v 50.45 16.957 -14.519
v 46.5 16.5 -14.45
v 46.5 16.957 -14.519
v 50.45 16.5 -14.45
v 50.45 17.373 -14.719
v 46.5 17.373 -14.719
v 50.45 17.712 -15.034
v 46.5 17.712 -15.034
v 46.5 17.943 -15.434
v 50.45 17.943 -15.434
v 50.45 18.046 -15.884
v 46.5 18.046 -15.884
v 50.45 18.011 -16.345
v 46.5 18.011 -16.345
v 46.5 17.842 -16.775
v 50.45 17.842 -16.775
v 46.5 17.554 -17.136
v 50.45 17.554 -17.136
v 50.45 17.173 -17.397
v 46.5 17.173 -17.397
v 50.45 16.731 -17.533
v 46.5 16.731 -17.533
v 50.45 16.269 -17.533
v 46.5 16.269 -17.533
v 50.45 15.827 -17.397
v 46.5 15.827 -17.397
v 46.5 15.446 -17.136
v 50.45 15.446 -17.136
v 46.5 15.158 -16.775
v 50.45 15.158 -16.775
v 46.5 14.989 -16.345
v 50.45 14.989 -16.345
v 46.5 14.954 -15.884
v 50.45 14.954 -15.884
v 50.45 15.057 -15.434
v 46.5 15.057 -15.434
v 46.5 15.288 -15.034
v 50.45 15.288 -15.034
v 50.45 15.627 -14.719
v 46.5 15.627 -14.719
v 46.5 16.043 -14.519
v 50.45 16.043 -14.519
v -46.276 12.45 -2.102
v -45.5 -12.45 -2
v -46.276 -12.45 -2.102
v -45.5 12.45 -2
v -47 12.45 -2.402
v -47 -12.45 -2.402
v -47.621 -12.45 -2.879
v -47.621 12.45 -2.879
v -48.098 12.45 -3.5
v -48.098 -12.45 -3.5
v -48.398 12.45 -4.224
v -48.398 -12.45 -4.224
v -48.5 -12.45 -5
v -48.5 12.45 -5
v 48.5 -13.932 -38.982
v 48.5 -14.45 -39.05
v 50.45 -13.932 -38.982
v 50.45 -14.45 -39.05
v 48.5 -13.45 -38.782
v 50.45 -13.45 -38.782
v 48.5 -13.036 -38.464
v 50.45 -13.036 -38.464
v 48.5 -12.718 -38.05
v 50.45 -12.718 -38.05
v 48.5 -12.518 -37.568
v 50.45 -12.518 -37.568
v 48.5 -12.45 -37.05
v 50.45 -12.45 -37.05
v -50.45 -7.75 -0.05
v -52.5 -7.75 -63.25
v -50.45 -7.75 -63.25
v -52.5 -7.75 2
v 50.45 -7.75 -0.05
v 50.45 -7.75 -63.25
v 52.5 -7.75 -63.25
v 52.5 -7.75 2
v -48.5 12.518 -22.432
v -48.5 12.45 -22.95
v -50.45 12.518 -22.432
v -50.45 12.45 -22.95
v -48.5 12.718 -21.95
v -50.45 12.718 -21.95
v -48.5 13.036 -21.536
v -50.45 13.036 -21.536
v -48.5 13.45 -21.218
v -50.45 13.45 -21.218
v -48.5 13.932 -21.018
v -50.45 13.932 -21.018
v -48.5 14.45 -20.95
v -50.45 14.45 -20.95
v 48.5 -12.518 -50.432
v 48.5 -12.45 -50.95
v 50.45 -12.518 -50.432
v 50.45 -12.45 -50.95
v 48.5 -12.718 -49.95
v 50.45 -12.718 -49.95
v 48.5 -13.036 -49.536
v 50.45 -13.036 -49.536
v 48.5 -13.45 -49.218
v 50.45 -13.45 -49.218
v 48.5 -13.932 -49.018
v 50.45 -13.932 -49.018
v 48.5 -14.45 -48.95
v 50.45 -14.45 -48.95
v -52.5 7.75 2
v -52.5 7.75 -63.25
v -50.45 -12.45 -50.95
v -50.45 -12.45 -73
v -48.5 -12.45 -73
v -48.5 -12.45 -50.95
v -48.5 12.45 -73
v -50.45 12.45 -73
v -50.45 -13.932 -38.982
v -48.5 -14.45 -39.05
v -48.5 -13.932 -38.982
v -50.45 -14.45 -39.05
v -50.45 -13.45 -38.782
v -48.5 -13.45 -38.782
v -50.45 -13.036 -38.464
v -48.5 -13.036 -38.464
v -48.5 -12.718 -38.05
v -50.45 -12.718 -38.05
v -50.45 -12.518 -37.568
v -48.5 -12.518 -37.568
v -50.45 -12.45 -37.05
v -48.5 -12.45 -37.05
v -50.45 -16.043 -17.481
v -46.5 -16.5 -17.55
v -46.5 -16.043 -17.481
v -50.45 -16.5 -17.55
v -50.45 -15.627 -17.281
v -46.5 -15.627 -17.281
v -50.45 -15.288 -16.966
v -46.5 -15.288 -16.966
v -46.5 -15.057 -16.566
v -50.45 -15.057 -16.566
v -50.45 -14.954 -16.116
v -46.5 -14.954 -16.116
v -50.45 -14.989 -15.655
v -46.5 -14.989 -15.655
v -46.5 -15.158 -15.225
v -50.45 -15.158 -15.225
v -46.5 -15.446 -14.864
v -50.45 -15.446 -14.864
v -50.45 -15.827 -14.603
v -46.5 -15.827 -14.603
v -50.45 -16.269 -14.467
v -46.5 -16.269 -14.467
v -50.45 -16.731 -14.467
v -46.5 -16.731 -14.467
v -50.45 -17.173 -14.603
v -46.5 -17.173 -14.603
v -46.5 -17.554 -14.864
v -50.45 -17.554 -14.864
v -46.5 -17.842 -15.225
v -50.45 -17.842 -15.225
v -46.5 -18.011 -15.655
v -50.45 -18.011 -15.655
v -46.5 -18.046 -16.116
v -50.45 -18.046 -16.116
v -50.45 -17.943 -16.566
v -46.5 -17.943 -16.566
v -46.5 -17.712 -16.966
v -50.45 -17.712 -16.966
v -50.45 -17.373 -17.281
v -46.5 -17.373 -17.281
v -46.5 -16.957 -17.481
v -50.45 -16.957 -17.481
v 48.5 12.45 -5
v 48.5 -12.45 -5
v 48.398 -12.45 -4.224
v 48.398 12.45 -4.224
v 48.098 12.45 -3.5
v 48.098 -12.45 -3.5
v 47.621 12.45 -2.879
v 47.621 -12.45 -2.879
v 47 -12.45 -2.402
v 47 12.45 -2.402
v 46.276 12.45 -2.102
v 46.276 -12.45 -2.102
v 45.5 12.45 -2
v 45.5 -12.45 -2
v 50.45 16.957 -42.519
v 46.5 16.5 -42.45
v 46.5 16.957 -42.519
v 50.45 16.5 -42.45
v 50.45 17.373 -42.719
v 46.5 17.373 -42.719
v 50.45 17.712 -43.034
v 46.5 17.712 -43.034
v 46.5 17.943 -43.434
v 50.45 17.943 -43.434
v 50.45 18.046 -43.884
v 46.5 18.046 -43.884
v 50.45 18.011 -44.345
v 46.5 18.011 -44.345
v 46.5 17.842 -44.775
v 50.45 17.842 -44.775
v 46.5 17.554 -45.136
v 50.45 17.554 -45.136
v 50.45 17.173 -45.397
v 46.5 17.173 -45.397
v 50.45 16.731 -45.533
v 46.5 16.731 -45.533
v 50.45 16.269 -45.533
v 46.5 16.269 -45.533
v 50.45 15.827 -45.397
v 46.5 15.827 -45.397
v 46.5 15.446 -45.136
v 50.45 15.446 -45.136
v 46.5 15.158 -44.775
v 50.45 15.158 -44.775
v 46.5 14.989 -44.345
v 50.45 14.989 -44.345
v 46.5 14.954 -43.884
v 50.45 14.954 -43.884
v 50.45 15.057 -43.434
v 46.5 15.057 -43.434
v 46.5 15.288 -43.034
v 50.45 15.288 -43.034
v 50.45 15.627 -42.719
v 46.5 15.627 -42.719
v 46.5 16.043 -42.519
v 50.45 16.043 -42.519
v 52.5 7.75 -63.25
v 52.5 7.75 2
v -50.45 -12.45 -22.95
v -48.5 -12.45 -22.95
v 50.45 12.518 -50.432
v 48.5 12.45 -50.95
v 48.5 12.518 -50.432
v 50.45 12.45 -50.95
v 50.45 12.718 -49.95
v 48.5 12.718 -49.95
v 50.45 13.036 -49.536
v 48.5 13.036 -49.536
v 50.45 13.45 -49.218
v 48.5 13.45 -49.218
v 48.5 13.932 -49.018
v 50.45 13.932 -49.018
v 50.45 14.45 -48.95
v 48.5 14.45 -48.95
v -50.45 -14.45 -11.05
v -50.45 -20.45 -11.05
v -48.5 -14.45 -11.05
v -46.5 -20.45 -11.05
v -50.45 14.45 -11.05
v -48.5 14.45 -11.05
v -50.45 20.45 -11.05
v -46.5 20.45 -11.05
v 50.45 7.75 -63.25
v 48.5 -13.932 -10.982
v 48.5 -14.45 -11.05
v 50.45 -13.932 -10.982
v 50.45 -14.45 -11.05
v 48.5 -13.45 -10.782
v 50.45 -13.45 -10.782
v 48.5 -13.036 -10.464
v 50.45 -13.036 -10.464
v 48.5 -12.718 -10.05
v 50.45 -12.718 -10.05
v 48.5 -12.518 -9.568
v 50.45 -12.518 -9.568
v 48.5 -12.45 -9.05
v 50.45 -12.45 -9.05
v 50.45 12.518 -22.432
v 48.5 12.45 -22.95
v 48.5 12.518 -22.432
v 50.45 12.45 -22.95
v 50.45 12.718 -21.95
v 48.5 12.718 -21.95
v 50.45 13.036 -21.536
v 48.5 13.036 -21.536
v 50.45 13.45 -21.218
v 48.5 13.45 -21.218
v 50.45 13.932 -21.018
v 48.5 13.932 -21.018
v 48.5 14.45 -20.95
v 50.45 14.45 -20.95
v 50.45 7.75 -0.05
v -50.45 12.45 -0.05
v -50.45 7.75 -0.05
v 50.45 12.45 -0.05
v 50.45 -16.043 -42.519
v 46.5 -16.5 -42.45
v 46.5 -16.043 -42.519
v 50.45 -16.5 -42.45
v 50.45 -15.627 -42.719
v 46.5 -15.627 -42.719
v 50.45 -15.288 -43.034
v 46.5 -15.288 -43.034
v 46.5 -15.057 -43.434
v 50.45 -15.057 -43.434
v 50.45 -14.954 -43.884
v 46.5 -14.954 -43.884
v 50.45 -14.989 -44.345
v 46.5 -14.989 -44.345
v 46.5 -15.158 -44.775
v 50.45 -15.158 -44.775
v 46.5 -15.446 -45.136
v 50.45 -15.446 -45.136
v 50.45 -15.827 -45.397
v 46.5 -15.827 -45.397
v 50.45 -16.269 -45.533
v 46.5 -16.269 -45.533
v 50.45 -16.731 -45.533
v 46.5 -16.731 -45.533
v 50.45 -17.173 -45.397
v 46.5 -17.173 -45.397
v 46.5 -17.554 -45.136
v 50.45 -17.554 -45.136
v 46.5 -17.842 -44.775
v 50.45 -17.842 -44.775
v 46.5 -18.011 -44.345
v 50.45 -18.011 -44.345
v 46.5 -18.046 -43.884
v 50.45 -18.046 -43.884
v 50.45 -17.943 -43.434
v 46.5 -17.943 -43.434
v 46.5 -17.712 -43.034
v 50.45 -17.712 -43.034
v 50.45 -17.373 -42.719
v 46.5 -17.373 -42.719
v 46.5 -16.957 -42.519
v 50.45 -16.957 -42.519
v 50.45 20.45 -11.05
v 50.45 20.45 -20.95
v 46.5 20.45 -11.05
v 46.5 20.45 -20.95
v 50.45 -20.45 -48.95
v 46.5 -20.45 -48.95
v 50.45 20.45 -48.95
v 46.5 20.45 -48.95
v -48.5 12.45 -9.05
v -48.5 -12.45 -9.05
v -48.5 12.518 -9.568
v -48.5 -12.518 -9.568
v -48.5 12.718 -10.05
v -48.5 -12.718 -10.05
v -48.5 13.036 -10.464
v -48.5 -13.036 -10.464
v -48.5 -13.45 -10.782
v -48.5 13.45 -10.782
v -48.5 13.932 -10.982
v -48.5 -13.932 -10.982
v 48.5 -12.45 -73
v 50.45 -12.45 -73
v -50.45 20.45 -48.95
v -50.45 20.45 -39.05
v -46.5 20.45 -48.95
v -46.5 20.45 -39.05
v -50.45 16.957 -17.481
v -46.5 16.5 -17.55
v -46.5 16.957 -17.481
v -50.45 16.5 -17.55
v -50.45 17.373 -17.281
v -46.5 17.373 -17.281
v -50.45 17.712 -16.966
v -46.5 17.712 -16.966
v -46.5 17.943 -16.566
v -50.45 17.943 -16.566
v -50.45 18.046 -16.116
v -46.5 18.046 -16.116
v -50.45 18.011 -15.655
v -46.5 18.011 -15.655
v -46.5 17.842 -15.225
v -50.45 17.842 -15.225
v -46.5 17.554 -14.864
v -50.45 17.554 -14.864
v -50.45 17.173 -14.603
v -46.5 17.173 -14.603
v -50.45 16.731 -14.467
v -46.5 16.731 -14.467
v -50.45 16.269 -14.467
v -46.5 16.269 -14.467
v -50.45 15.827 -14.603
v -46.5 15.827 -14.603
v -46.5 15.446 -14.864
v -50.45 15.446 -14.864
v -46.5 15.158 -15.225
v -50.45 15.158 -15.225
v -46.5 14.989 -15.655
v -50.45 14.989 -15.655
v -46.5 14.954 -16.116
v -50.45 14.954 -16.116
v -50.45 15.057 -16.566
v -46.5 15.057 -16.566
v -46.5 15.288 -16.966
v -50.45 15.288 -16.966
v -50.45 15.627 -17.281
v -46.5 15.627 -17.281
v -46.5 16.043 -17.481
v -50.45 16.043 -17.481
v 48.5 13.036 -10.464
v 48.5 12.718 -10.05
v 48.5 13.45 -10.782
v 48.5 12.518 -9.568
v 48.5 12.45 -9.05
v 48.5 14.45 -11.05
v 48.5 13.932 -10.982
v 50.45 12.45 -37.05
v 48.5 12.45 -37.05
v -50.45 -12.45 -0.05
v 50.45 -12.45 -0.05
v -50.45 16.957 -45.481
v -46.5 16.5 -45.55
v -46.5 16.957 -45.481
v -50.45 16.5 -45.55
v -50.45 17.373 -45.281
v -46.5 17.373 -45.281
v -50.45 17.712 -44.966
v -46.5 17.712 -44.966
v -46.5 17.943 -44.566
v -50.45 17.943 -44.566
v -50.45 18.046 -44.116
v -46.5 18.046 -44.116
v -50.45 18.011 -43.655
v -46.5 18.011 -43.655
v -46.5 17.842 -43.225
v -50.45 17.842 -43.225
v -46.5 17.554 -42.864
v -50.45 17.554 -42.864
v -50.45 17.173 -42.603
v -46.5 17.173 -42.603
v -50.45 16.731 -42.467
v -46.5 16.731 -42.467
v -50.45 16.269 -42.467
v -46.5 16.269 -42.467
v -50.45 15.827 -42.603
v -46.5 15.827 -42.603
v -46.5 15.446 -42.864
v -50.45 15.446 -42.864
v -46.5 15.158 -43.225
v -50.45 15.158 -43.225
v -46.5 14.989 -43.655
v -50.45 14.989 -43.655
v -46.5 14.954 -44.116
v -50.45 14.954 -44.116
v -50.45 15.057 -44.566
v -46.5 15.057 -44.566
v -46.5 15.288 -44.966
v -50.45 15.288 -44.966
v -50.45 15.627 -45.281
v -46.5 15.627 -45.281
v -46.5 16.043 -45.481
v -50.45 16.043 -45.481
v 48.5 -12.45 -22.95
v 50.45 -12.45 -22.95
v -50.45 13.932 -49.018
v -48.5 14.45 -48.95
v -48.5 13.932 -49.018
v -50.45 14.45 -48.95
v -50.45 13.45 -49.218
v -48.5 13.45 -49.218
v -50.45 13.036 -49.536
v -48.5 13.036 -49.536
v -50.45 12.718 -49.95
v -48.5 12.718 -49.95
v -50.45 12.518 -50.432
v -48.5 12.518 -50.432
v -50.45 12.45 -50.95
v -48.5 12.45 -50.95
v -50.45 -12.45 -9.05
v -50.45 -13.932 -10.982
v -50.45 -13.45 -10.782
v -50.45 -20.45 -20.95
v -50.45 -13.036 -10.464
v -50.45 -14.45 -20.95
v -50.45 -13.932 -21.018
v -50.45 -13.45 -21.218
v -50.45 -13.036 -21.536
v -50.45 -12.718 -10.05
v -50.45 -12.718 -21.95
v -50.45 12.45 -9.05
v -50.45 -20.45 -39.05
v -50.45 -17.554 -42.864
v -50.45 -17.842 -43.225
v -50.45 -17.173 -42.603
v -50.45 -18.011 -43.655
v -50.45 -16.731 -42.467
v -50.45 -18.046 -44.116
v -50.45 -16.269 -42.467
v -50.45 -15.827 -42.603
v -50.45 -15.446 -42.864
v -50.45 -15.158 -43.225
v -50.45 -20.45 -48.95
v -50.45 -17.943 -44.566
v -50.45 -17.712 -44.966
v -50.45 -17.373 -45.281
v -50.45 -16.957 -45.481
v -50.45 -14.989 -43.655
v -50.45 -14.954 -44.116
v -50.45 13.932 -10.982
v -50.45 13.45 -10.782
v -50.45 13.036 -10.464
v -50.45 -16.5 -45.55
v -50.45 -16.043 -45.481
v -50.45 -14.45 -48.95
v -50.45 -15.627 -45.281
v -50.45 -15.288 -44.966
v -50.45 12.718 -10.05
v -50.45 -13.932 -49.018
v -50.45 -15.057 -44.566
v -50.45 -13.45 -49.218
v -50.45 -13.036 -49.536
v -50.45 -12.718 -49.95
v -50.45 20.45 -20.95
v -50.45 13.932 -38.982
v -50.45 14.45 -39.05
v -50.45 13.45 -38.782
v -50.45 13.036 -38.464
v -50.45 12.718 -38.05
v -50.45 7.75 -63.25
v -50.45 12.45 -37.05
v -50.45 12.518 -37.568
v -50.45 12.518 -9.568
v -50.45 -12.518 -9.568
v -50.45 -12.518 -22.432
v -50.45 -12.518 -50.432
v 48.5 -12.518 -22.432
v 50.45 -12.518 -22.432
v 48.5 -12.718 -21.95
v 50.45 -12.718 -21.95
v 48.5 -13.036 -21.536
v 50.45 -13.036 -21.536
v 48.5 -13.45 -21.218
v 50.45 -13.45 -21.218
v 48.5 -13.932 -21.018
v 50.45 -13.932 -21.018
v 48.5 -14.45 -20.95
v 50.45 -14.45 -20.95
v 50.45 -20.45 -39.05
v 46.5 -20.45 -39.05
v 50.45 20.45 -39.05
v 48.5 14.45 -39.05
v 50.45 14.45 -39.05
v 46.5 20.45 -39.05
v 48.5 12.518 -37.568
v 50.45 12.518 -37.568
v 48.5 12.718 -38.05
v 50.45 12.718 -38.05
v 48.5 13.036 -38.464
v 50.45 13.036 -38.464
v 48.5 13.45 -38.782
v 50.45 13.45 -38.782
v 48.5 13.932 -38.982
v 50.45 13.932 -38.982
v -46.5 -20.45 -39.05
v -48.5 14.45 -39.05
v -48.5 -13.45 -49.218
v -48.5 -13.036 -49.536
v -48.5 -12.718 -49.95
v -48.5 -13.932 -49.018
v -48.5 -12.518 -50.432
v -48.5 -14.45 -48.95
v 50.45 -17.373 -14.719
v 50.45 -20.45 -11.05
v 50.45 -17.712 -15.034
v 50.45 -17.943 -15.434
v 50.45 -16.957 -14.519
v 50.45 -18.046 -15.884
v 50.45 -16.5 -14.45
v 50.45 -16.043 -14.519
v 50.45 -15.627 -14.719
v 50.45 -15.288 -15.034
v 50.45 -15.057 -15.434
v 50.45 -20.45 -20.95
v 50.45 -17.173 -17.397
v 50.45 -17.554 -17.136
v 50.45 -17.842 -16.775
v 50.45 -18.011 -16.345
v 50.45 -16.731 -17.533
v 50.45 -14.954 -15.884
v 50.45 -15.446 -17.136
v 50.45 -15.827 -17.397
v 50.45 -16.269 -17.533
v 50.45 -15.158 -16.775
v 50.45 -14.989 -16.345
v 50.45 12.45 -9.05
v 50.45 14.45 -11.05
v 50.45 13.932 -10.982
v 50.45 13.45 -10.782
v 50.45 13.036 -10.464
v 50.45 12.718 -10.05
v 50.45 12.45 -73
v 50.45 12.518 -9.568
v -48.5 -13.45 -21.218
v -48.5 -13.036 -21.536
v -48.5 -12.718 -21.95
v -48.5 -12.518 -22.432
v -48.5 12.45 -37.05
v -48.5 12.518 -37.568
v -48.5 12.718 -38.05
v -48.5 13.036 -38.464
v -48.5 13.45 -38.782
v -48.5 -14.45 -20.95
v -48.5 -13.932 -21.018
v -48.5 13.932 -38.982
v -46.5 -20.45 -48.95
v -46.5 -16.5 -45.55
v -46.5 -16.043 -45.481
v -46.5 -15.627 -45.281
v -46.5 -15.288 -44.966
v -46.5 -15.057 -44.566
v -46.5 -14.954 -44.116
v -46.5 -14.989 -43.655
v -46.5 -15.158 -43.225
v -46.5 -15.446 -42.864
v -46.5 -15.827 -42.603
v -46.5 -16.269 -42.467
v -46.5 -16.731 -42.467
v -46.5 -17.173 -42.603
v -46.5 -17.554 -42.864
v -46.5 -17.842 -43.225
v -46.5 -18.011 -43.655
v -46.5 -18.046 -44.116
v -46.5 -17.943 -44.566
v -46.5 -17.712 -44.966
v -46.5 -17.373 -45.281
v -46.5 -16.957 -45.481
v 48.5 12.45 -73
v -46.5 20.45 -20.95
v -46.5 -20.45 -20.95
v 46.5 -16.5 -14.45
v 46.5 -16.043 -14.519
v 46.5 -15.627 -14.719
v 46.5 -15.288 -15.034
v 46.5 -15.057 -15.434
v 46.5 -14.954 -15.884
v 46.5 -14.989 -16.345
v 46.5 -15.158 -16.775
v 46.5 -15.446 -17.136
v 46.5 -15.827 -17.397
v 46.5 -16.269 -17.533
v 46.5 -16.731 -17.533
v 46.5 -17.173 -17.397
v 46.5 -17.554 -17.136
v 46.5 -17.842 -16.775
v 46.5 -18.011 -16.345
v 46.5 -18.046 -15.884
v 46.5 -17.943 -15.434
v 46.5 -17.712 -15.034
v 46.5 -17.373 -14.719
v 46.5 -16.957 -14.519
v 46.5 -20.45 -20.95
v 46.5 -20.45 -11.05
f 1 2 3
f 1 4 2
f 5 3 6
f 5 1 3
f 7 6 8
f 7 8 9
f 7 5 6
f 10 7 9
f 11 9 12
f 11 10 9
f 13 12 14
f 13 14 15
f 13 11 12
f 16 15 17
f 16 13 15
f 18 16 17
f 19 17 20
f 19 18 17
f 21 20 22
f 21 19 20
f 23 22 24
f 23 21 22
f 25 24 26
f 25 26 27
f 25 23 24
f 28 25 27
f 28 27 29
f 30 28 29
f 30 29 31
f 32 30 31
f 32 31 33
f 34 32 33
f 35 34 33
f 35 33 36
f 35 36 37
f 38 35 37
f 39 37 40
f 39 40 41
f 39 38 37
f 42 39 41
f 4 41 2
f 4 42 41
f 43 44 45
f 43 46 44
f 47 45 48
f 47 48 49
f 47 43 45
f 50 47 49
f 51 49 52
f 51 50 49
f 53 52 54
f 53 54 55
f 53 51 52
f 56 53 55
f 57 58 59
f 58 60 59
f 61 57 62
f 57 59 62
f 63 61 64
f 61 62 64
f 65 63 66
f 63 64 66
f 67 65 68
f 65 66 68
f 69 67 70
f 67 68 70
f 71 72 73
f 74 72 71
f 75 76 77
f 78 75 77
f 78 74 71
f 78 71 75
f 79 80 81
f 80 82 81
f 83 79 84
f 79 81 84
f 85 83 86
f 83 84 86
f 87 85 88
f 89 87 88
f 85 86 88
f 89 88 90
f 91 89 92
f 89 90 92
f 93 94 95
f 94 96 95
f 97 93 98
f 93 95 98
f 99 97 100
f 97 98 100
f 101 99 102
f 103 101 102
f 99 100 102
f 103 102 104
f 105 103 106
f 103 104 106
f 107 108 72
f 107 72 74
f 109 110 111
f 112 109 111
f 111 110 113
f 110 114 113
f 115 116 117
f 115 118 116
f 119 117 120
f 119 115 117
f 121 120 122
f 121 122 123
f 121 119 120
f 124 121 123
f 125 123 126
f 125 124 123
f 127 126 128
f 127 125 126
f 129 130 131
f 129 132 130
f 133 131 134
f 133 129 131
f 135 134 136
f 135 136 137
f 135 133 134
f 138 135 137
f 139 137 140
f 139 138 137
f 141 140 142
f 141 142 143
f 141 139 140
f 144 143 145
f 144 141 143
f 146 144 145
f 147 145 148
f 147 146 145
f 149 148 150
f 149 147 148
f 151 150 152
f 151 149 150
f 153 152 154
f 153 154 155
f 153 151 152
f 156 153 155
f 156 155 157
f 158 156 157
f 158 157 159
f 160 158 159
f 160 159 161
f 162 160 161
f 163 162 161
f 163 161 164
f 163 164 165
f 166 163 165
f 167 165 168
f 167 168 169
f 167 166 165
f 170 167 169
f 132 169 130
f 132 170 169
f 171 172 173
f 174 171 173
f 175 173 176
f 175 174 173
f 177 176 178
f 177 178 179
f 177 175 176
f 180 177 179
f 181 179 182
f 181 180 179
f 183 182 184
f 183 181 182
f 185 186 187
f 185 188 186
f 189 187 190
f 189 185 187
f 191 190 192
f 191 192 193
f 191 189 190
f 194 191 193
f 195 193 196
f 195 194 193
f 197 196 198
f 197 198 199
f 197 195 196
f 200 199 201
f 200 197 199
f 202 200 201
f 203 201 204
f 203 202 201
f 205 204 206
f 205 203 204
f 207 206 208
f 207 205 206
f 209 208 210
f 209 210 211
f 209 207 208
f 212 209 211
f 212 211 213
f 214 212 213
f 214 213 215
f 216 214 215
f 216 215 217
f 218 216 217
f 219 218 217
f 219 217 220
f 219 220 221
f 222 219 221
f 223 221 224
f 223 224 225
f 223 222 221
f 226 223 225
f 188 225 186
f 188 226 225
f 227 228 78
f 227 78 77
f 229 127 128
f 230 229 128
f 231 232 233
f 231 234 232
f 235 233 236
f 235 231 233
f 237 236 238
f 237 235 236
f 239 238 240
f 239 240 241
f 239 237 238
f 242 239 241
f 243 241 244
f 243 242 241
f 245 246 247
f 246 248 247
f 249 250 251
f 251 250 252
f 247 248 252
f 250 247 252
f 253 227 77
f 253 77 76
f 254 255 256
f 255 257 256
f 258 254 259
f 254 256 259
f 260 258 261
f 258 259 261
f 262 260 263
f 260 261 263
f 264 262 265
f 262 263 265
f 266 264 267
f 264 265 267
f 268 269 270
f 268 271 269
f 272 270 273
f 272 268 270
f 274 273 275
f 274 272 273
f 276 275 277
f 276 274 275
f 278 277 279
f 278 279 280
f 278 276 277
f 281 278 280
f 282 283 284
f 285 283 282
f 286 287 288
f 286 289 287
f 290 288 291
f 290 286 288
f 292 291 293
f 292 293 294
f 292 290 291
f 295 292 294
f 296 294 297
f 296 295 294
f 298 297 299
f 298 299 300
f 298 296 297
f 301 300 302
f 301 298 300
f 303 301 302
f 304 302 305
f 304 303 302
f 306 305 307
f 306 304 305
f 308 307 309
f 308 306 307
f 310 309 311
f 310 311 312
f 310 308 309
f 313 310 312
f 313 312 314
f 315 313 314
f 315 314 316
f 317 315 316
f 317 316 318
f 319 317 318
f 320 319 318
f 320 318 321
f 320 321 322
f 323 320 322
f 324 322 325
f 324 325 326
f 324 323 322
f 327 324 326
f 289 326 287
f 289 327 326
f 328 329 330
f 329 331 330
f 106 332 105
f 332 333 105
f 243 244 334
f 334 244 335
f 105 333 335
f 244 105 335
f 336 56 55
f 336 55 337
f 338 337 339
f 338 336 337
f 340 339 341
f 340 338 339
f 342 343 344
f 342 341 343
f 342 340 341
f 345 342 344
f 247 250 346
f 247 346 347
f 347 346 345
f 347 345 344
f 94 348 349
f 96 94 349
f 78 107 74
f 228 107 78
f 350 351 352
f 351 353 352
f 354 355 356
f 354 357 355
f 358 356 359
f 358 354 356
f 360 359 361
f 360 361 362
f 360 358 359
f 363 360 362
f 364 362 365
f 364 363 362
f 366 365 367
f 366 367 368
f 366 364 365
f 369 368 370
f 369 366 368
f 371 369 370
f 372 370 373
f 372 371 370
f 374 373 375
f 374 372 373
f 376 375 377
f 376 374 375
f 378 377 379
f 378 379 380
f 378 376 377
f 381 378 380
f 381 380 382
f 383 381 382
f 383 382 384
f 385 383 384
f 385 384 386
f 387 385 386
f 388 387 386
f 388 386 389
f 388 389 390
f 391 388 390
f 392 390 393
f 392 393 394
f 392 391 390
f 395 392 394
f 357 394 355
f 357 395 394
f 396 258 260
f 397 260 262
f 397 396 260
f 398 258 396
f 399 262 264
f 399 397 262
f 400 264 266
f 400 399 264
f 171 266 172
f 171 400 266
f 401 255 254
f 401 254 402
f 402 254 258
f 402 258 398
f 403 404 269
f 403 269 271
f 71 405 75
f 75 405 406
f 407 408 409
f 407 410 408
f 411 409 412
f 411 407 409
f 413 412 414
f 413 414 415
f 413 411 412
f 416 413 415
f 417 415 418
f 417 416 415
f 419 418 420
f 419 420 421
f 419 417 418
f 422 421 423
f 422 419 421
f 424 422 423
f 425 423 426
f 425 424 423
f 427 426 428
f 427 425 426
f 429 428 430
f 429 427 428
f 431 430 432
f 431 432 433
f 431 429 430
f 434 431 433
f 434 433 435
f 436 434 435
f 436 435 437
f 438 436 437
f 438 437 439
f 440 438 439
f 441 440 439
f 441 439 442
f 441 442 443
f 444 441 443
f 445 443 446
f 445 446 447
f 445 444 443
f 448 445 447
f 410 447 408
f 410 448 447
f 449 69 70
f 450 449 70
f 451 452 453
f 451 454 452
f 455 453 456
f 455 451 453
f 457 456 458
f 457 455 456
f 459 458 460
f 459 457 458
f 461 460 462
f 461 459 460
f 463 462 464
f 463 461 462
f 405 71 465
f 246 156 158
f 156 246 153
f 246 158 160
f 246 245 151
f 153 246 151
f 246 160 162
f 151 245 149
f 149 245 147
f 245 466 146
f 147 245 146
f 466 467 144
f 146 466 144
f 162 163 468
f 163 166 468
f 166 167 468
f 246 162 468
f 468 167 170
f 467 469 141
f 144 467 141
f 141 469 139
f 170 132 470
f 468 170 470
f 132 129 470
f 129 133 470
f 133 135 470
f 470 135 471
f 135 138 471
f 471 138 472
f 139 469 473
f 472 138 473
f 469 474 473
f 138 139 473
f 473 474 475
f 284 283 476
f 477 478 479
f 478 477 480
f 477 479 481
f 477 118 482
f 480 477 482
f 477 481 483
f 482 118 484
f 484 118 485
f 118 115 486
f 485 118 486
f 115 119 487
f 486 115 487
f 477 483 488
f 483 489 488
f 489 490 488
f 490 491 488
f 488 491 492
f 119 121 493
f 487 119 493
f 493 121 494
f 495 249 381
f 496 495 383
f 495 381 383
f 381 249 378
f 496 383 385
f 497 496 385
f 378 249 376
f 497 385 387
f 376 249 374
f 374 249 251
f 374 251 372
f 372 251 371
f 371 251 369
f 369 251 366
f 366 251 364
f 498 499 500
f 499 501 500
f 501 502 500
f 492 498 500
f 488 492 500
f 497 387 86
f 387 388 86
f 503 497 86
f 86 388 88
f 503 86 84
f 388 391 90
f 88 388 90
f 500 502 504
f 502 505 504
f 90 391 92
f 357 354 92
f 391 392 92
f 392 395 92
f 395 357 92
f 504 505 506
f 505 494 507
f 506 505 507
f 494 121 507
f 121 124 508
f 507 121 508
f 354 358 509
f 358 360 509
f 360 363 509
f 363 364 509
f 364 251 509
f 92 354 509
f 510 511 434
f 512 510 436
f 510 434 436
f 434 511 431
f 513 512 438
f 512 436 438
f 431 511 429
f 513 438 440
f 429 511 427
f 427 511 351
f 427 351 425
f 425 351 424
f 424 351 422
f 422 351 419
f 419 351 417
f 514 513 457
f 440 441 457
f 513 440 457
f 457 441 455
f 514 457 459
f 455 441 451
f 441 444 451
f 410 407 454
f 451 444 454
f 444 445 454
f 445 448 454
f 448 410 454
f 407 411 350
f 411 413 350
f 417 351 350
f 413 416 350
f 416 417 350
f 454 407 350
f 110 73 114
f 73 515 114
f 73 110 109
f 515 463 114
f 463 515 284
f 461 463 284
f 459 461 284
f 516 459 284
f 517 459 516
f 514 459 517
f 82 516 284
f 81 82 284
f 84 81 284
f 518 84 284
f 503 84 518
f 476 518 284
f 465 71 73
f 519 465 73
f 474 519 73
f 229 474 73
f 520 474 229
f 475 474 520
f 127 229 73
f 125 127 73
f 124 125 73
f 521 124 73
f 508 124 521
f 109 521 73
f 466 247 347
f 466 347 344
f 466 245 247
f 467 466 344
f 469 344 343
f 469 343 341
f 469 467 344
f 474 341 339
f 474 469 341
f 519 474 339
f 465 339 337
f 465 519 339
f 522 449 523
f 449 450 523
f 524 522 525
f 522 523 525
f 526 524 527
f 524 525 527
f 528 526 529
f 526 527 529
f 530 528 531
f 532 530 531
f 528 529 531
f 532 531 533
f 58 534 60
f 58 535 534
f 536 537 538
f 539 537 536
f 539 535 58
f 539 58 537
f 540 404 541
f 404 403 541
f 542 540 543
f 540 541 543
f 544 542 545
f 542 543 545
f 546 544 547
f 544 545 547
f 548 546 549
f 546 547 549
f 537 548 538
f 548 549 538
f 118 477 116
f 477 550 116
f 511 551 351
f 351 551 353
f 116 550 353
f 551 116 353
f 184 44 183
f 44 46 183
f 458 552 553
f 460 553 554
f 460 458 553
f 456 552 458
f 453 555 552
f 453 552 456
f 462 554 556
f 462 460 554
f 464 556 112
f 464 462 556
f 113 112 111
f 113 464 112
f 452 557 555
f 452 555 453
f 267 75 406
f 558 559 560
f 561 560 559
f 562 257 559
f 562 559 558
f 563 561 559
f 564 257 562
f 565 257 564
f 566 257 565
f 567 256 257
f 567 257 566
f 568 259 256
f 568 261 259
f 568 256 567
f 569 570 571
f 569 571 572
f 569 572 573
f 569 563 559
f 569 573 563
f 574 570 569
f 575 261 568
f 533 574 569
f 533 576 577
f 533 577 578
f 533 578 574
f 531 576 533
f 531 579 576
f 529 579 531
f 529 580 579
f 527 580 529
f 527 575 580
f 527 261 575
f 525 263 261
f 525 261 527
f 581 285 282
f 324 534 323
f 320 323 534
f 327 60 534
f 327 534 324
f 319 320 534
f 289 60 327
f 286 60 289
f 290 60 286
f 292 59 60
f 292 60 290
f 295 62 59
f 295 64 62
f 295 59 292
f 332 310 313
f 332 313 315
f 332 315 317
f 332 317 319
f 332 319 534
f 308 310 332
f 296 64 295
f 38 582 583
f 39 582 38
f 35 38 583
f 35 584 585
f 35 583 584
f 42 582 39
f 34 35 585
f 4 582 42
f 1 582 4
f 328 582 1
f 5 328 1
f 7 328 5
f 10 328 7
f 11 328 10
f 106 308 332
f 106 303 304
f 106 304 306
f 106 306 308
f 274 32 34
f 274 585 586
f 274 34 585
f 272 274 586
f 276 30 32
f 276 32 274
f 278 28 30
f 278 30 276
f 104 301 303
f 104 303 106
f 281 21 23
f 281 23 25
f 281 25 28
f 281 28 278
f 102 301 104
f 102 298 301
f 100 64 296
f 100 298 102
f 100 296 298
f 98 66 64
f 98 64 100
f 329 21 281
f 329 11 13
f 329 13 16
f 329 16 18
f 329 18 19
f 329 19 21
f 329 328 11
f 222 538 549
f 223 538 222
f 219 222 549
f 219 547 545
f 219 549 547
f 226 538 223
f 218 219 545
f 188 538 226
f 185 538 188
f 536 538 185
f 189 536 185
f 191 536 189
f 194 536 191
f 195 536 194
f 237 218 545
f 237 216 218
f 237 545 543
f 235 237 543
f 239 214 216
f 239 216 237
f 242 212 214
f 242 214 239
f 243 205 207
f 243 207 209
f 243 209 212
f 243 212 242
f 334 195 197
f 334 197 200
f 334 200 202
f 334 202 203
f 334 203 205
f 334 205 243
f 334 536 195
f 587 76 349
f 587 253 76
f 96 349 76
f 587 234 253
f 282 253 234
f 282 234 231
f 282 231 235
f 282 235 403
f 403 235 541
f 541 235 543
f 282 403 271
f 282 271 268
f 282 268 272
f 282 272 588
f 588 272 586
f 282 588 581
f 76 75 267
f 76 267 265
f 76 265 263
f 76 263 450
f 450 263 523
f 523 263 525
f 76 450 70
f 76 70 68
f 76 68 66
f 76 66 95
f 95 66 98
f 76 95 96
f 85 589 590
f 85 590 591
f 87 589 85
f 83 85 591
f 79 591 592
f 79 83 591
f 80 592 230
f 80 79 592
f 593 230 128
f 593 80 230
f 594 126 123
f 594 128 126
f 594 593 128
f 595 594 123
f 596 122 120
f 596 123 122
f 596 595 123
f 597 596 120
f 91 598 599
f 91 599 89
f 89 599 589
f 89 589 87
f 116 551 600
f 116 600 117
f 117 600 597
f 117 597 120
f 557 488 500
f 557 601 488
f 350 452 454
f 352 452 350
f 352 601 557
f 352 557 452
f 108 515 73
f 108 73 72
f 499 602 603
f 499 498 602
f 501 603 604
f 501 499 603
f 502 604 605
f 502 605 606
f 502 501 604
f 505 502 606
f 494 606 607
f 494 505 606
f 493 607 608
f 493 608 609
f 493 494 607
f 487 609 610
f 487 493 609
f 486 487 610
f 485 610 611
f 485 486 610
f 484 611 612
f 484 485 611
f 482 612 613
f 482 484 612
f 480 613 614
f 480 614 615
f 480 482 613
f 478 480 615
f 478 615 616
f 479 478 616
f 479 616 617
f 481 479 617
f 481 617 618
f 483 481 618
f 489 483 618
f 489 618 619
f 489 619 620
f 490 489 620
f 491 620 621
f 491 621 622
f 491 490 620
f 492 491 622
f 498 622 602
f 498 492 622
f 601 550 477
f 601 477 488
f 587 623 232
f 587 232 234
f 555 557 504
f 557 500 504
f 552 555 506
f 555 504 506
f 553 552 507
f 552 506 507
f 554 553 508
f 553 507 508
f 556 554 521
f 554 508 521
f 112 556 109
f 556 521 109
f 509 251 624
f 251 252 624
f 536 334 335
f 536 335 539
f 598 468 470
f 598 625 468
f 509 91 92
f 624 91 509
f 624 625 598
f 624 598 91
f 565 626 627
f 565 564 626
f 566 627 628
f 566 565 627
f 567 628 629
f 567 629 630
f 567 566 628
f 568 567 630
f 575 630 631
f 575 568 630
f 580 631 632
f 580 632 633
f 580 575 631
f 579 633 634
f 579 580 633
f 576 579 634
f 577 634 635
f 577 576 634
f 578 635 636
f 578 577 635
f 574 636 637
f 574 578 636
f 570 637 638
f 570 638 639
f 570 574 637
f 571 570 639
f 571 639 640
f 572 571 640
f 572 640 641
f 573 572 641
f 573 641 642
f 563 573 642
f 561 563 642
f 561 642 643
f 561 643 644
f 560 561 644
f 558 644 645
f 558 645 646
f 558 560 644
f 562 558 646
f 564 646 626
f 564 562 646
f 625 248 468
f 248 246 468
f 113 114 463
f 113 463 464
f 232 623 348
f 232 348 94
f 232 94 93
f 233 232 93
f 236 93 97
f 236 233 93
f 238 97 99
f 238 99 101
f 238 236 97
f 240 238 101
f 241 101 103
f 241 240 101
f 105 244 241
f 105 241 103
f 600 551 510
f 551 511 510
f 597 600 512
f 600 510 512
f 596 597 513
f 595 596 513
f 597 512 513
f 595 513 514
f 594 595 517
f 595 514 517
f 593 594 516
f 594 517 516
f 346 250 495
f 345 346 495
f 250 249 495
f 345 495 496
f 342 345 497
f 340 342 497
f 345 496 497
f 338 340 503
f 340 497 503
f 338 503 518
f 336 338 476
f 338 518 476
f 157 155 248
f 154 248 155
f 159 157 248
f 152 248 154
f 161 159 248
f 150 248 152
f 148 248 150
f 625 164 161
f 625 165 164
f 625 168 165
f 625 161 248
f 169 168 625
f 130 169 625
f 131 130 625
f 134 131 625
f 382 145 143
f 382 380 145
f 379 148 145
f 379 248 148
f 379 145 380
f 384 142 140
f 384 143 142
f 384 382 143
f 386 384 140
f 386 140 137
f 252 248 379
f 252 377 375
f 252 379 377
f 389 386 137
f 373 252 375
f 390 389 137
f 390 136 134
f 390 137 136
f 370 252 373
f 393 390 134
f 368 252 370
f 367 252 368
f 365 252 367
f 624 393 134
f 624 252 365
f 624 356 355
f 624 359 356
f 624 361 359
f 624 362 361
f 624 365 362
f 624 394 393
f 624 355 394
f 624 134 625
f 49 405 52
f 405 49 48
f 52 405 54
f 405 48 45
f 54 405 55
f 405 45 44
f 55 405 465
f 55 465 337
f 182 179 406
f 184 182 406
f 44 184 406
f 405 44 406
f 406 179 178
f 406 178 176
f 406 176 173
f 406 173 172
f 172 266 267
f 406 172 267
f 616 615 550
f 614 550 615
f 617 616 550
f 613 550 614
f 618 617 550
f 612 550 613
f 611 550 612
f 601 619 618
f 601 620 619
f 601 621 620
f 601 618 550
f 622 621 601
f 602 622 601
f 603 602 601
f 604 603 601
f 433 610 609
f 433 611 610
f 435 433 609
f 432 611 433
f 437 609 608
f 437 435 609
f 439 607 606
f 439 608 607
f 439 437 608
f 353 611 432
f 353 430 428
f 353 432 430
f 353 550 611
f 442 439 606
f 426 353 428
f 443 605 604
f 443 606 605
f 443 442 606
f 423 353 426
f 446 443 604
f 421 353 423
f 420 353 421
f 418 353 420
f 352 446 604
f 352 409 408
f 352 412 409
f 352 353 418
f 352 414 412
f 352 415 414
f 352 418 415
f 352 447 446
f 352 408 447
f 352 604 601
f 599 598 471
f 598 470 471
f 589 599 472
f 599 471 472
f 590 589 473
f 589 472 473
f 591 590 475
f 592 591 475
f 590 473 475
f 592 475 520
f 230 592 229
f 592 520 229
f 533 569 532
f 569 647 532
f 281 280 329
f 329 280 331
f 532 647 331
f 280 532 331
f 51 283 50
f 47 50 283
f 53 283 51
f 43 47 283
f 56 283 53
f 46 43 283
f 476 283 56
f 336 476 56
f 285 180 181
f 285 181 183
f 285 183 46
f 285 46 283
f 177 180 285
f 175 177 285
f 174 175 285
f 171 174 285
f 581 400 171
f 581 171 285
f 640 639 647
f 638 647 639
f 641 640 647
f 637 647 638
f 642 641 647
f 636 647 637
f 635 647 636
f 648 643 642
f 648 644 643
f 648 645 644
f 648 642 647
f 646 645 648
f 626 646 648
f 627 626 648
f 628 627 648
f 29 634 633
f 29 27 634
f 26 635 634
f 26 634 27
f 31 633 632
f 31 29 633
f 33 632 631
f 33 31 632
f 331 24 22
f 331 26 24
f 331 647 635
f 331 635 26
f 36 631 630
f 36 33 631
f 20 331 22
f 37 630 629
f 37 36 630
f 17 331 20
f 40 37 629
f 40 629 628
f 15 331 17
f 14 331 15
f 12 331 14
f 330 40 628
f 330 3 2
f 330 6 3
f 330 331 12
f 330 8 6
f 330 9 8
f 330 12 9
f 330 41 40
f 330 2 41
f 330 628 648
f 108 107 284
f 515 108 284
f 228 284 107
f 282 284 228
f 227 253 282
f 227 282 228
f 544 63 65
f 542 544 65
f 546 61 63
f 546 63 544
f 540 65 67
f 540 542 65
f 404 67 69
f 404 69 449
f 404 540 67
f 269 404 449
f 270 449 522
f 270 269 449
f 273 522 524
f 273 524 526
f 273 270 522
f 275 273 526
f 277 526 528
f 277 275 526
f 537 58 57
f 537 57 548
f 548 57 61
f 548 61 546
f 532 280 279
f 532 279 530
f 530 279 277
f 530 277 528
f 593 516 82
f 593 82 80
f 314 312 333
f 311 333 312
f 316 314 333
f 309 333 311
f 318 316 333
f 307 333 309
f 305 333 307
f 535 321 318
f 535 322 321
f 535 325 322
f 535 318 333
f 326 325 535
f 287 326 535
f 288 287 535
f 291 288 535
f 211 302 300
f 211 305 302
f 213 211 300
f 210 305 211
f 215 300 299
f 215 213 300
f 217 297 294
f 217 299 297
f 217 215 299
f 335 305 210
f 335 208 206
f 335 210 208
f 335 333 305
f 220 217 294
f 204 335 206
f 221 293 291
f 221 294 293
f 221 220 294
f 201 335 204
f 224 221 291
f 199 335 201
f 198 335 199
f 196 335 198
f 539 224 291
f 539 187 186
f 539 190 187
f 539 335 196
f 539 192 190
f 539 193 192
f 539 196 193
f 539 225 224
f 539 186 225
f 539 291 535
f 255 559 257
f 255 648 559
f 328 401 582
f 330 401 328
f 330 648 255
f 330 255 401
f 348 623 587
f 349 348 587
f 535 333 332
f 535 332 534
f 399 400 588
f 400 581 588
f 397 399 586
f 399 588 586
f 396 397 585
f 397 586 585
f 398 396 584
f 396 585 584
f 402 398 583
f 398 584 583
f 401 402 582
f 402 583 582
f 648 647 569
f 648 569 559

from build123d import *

# Parameters (mm, degrees)
SKETCH1_W                = 1.95
SKETCH1_H                = 9.75
SKETCH1_W_2              = 105
SKETCH1_H_2              = 4
BOSS_EXTRUDE1_DEPTH      = 12.45
SKETCH2_W                = 9.9
SKETCH2_H                = 8
SKETCH2_R                = 1.55
BOSS_EXTRUDE2_DEPTH      = 2
BOSS_EXTRUDE2_DEPTH_BACK = 1.95
BOSS_EXTRUDE3_REACH      = 8
SKETCH3_W                = 9.9
SKETCH3_H                = 24.9
SKETCH4_W                = 9.9
SKETCH4_H                = 8
SKETCH4_R                = 1.55
BOSS_EXTRUDE4_DEPTH      = 2
BOSS_EXTRUDE4_DEPTH_BACK = 1.95
BOSS_EXTRUDE5_REACH      = 8
SKETCH5_W                = 9.9
SKETCH5_H                = 24.9
SKETCH6_W                = 100.9
SKETCH6_H                = 2.05
CUT_EXTRUDE1_DEPTH       = 4.7
SKETCH7_W                = 100.9
SKETCH7_H                = 2.05
CUT_EXTRUDE2_DEPTH       = 4.7
FILLET1_R                = 2
FILLET2_R                = 3


with BuildPart() as part:
    # Sketch1 → Boss-Extrude1 (new body, symmetric)
    with BuildSketch(Plane(origin=(0, 0, 0), x_dir=(1, 0, 0), z_dir=(0, 1, 0))):
        Polygon((-52.5, 63.25), (-52.5, 2), (-48.5, 2), (-48.5, 63.25), (-50.45, 63.25), align=None)
        with Locations((-49.475, 68.125)):
            Rectangle(SKETCH1_W, SKETCH1_H)
        Rectangle(SKETCH1_W_2, SKETCH1_H_2)
        Polygon((48.5, 63.25), (48.5, 2), (52.5, 2), (52.5, 63.25), (50.45, 63.25), align=None)
        with Locations((49.475, 68.125)):
            Rectangle(SKETCH1_W, SKETCH1_H)
    extrude(amount=BOSS_EXTRUDE1_DEPTH, both=True)

    # Sketch2 → Boss-Extrude2 (add, two sides)
    with BuildSketch(Plane.ZY.offset(-48.5)) as boss_extrude2_sk:
        with Locations((-16, -16.45)):
            Rectangle(SKETCH2_W, SKETCH2_H)
        with Locations((-16, -16.5)):
            Circle(SKETCH2_R, mode=Mode.SUBTRACT)
        with Locations((-44, -16.45)):
            Rectangle(SKETCH2_W, SKETCH2_H)
        with Locations((-44, -16.5)):
            Circle(SKETCH2_R, mode=Mode.SUBTRACT)
        with Locations((-16, 16.45)):
            Rectangle(SKETCH2_W, SKETCH2_H)
        with Locations((-16, 16.5)):
            Circle(SKETCH2_R, mode=Mode.SUBTRACT)
        with Locations((-44, 16.45)):
            Rectangle(SKETCH2_W, SKETCH2_H)
        with Locations((-44, 16.5)):
            Circle(SKETCH2_R, mode=Mode.SUBTRACT)
    extrude(amount=BOSS_EXTRUDE2_DEPTH)
    extrude(boss_extrude2_sk.sketch, amount=-BOSS_EXTRUDE2_DEPTH_BACK)

    # Sketch3 → Boss-Extrude3 (add, up to next)
    with BuildSketch(Plane.ZY.offset(-46.5), mode=Mode.PRIVATE) as boss_extrude3_sk1:
        with Locations((-44, 0)):
            Rectangle(SKETCH3_W, SKETCH3_H)
    boss_extrude3_tool1 = extrude(boss_extrude3_sk1.sketch, amount=-BOSS_EXTRUDE3_REACH, mode=Mode.PRIVATE) - part.part
    add(boss_extrude3_tool1.solids().sort_by_distance((46.5, 0, -44))[0])
    # Sketch3 → Boss-Extrude3 (add, up to next)
    with BuildSketch(Plane.ZY.offset(-46.5), mode=Mode.PRIVATE) as boss_extrude3_sk2:
        with Locations((-16, 0)):
            Rectangle(SKETCH3_W, SKETCH3_H)
    boss_extrude3_tool2 = extrude(boss_extrude3_sk2.sketch, amount=-BOSS_EXTRUDE3_REACH, mode=Mode.PRIVATE) - part.part
    add(boss_extrude3_tool2.solids().sort_by_distance((46.5, 0, -16))[0])

    # Sketch4 → Boss-Extrude4 (add, two sides)
    with BuildSketch(Plane(origin=(-48.5, 0, 0), x_dir=(0, 0, -1), z_dir=(1, 0, 0))) as boss_extrude4_sk:
        with Locations((16, 16.45)):
            Rectangle(SKETCH4_W, SKETCH4_H)
        with Locations((16, 16.5)):
            Circle(SKETCH4_R, mode=Mode.SUBTRACT)
        with Locations((44, 16.45)):
            Rectangle(SKETCH4_W, SKETCH4_H)
        with Locations((44, 16.5)):
            Circle(SKETCH4_R, mode=Mode.SUBTRACT)
        with Locations((44, -16.45)):
            Rectangle(SKETCH4_W, SKETCH4_H)
        with Locations((44, -16.5)):
            Circle(SKETCH4_R, mode=Mode.SUBTRACT)
        with Locations((16, -16.45)):
            Rectangle(SKETCH4_W, SKETCH4_H)
        with Locations((16, -16.5)):
            Circle(SKETCH4_R, mode=Mode.SUBTRACT)
    extrude(amount=BOSS_EXTRUDE4_DEPTH)
    extrude(boss_extrude4_sk.sketch, amount=-BOSS_EXTRUDE4_DEPTH_BACK)

    # Sketch5 → Boss-Extrude5 (add, up to next)
    with BuildSketch(Plane(origin=(-46.5, 0, 0), x_dir=(0, 0, -1), z_dir=(1, 0, 0)), mode=Mode.PRIVATE) as boss_extrude5_sk1:
        with Locations((16, 0)):
            Rectangle(SKETCH5_W, SKETCH5_H)
    boss_extrude5_tool1 = extrude(boss_extrude5_sk1.sketch, amount=-BOSS_EXTRUDE5_REACH, mode=Mode.PRIVATE) - part.part
    add(boss_extrude5_tool1.solids().sort_by_distance((-46.5, 0, -16))[0])
    # Sketch5 → Boss-Extrude5 (add, up to next)
    with BuildSketch(Plane(origin=(-46.5, 0, 0), x_dir=(0, 0, -1), z_dir=(1, 0, 0)), mode=Mode.PRIVATE) as boss_extrude5_sk2:
        with Locations((44, 0)):
            Rectangle(SKETCH5_W, SKETCH5_H)
    boss_extrude5_tool2 = extrude(boss_extrude5_sk2.sketch, amount=-BOSS_EXTRUDE5_REACH, mode=Mode.PRIVATE) - part.part
    add(boss_extrude5_tool2.solids().sort_by_distance((-46.5, 0, -44))[0])

    # Sketch6 → Cut-Extrude1 (cut)
    with BuildSketch(Plane.XZ.offset(12.45)):
        with Locations((0, 0.975)):
            Rectangle(SKETCH6_W, SKETCH6_H)
        Polygon((50.45, 2), (50.45, -0.05), (50.45, -63.25), (52.5, -63.25), (52.5, 2), align=None)
        Polygon((-52.5, -63.25), (-50.45, -63.25), (-50.45, -0.05), (-50.45, 2), (-52.5, 2), align=None)
    extrude(amount=-CUT_EXTRUDE1_DEPTH, mode=Mode.SUBTRACT)

    # Sketch7 → Cut-Extrude2 (cut)
    with BuildSketch(Plane(origin=(0, 12.45, 0), x_dir=(1, 0, 0), z_dir=(0, 1, 0))):
        Polygon((-50.45, 48.95), (-50.45, 63.25), (-52.5, 63.25), (-52.5, -2), (-50.45, -2), (-50.45, 0.05), (-50.45, 11.05), (-50.45, 20.95), (-50.45, 39.05), align=None)
        with Locations((0, -0.975)):
            Rectangle(SKETCH7_W, SKETCH7_H)
        Polygon((50.45, 0.05), (50.45, -2), (52.5, -2), (52.5, 63.25), (50.45, 63.25), (50.45, 48.95), (50.45, 39.05), (50.45, 20.95), (50.45, 11.05), align=None)
    extrude(amount=-CUT_EXTRUDE2_DEPTH, mode=Mode.SUBTRACT)

    # Fillet1
    fillet1_edges = [part.edges().sort_by_distance(p)[0] for p in [
        (-49.475, 12.45, -11.05),
        (-49.475, 12.45, -20.95),
        (-49.475, 12.45, -39.05),
        (-49.475, 12.45, -48.95),
        (-49.475, -12.45, -39.05),
        (-49.475, -12.45, -48.95),
        (-49.475, -12.45, -11.05),
        (-49.475, -12.45, -20.95),
        (49.475, -12.45, -20.95),
        (49.475, -12.45, -11.05),
        (49.475, -12.45, -48.95),
        (49.475, -12.45, -39.05),
        (49.475, 12.45, -11.05),
        (49.475, 12.45, -20.95),
        (49.475, 12.45, -48.95),
        (49.475, 12.45, -39.05),
    ]]
    fillet(fillet1_edges, radius=FILLET1_R)

    # Fillet2
    fillet2_edges = [part.edges().sort_by_distance(p)[0] for p in [
        (-48.5, 0, -2),
        (48.5, 0, -2),
    ]]
    fillet(fillet2_edges, radius=FILLET2_R)


solid = part.part
